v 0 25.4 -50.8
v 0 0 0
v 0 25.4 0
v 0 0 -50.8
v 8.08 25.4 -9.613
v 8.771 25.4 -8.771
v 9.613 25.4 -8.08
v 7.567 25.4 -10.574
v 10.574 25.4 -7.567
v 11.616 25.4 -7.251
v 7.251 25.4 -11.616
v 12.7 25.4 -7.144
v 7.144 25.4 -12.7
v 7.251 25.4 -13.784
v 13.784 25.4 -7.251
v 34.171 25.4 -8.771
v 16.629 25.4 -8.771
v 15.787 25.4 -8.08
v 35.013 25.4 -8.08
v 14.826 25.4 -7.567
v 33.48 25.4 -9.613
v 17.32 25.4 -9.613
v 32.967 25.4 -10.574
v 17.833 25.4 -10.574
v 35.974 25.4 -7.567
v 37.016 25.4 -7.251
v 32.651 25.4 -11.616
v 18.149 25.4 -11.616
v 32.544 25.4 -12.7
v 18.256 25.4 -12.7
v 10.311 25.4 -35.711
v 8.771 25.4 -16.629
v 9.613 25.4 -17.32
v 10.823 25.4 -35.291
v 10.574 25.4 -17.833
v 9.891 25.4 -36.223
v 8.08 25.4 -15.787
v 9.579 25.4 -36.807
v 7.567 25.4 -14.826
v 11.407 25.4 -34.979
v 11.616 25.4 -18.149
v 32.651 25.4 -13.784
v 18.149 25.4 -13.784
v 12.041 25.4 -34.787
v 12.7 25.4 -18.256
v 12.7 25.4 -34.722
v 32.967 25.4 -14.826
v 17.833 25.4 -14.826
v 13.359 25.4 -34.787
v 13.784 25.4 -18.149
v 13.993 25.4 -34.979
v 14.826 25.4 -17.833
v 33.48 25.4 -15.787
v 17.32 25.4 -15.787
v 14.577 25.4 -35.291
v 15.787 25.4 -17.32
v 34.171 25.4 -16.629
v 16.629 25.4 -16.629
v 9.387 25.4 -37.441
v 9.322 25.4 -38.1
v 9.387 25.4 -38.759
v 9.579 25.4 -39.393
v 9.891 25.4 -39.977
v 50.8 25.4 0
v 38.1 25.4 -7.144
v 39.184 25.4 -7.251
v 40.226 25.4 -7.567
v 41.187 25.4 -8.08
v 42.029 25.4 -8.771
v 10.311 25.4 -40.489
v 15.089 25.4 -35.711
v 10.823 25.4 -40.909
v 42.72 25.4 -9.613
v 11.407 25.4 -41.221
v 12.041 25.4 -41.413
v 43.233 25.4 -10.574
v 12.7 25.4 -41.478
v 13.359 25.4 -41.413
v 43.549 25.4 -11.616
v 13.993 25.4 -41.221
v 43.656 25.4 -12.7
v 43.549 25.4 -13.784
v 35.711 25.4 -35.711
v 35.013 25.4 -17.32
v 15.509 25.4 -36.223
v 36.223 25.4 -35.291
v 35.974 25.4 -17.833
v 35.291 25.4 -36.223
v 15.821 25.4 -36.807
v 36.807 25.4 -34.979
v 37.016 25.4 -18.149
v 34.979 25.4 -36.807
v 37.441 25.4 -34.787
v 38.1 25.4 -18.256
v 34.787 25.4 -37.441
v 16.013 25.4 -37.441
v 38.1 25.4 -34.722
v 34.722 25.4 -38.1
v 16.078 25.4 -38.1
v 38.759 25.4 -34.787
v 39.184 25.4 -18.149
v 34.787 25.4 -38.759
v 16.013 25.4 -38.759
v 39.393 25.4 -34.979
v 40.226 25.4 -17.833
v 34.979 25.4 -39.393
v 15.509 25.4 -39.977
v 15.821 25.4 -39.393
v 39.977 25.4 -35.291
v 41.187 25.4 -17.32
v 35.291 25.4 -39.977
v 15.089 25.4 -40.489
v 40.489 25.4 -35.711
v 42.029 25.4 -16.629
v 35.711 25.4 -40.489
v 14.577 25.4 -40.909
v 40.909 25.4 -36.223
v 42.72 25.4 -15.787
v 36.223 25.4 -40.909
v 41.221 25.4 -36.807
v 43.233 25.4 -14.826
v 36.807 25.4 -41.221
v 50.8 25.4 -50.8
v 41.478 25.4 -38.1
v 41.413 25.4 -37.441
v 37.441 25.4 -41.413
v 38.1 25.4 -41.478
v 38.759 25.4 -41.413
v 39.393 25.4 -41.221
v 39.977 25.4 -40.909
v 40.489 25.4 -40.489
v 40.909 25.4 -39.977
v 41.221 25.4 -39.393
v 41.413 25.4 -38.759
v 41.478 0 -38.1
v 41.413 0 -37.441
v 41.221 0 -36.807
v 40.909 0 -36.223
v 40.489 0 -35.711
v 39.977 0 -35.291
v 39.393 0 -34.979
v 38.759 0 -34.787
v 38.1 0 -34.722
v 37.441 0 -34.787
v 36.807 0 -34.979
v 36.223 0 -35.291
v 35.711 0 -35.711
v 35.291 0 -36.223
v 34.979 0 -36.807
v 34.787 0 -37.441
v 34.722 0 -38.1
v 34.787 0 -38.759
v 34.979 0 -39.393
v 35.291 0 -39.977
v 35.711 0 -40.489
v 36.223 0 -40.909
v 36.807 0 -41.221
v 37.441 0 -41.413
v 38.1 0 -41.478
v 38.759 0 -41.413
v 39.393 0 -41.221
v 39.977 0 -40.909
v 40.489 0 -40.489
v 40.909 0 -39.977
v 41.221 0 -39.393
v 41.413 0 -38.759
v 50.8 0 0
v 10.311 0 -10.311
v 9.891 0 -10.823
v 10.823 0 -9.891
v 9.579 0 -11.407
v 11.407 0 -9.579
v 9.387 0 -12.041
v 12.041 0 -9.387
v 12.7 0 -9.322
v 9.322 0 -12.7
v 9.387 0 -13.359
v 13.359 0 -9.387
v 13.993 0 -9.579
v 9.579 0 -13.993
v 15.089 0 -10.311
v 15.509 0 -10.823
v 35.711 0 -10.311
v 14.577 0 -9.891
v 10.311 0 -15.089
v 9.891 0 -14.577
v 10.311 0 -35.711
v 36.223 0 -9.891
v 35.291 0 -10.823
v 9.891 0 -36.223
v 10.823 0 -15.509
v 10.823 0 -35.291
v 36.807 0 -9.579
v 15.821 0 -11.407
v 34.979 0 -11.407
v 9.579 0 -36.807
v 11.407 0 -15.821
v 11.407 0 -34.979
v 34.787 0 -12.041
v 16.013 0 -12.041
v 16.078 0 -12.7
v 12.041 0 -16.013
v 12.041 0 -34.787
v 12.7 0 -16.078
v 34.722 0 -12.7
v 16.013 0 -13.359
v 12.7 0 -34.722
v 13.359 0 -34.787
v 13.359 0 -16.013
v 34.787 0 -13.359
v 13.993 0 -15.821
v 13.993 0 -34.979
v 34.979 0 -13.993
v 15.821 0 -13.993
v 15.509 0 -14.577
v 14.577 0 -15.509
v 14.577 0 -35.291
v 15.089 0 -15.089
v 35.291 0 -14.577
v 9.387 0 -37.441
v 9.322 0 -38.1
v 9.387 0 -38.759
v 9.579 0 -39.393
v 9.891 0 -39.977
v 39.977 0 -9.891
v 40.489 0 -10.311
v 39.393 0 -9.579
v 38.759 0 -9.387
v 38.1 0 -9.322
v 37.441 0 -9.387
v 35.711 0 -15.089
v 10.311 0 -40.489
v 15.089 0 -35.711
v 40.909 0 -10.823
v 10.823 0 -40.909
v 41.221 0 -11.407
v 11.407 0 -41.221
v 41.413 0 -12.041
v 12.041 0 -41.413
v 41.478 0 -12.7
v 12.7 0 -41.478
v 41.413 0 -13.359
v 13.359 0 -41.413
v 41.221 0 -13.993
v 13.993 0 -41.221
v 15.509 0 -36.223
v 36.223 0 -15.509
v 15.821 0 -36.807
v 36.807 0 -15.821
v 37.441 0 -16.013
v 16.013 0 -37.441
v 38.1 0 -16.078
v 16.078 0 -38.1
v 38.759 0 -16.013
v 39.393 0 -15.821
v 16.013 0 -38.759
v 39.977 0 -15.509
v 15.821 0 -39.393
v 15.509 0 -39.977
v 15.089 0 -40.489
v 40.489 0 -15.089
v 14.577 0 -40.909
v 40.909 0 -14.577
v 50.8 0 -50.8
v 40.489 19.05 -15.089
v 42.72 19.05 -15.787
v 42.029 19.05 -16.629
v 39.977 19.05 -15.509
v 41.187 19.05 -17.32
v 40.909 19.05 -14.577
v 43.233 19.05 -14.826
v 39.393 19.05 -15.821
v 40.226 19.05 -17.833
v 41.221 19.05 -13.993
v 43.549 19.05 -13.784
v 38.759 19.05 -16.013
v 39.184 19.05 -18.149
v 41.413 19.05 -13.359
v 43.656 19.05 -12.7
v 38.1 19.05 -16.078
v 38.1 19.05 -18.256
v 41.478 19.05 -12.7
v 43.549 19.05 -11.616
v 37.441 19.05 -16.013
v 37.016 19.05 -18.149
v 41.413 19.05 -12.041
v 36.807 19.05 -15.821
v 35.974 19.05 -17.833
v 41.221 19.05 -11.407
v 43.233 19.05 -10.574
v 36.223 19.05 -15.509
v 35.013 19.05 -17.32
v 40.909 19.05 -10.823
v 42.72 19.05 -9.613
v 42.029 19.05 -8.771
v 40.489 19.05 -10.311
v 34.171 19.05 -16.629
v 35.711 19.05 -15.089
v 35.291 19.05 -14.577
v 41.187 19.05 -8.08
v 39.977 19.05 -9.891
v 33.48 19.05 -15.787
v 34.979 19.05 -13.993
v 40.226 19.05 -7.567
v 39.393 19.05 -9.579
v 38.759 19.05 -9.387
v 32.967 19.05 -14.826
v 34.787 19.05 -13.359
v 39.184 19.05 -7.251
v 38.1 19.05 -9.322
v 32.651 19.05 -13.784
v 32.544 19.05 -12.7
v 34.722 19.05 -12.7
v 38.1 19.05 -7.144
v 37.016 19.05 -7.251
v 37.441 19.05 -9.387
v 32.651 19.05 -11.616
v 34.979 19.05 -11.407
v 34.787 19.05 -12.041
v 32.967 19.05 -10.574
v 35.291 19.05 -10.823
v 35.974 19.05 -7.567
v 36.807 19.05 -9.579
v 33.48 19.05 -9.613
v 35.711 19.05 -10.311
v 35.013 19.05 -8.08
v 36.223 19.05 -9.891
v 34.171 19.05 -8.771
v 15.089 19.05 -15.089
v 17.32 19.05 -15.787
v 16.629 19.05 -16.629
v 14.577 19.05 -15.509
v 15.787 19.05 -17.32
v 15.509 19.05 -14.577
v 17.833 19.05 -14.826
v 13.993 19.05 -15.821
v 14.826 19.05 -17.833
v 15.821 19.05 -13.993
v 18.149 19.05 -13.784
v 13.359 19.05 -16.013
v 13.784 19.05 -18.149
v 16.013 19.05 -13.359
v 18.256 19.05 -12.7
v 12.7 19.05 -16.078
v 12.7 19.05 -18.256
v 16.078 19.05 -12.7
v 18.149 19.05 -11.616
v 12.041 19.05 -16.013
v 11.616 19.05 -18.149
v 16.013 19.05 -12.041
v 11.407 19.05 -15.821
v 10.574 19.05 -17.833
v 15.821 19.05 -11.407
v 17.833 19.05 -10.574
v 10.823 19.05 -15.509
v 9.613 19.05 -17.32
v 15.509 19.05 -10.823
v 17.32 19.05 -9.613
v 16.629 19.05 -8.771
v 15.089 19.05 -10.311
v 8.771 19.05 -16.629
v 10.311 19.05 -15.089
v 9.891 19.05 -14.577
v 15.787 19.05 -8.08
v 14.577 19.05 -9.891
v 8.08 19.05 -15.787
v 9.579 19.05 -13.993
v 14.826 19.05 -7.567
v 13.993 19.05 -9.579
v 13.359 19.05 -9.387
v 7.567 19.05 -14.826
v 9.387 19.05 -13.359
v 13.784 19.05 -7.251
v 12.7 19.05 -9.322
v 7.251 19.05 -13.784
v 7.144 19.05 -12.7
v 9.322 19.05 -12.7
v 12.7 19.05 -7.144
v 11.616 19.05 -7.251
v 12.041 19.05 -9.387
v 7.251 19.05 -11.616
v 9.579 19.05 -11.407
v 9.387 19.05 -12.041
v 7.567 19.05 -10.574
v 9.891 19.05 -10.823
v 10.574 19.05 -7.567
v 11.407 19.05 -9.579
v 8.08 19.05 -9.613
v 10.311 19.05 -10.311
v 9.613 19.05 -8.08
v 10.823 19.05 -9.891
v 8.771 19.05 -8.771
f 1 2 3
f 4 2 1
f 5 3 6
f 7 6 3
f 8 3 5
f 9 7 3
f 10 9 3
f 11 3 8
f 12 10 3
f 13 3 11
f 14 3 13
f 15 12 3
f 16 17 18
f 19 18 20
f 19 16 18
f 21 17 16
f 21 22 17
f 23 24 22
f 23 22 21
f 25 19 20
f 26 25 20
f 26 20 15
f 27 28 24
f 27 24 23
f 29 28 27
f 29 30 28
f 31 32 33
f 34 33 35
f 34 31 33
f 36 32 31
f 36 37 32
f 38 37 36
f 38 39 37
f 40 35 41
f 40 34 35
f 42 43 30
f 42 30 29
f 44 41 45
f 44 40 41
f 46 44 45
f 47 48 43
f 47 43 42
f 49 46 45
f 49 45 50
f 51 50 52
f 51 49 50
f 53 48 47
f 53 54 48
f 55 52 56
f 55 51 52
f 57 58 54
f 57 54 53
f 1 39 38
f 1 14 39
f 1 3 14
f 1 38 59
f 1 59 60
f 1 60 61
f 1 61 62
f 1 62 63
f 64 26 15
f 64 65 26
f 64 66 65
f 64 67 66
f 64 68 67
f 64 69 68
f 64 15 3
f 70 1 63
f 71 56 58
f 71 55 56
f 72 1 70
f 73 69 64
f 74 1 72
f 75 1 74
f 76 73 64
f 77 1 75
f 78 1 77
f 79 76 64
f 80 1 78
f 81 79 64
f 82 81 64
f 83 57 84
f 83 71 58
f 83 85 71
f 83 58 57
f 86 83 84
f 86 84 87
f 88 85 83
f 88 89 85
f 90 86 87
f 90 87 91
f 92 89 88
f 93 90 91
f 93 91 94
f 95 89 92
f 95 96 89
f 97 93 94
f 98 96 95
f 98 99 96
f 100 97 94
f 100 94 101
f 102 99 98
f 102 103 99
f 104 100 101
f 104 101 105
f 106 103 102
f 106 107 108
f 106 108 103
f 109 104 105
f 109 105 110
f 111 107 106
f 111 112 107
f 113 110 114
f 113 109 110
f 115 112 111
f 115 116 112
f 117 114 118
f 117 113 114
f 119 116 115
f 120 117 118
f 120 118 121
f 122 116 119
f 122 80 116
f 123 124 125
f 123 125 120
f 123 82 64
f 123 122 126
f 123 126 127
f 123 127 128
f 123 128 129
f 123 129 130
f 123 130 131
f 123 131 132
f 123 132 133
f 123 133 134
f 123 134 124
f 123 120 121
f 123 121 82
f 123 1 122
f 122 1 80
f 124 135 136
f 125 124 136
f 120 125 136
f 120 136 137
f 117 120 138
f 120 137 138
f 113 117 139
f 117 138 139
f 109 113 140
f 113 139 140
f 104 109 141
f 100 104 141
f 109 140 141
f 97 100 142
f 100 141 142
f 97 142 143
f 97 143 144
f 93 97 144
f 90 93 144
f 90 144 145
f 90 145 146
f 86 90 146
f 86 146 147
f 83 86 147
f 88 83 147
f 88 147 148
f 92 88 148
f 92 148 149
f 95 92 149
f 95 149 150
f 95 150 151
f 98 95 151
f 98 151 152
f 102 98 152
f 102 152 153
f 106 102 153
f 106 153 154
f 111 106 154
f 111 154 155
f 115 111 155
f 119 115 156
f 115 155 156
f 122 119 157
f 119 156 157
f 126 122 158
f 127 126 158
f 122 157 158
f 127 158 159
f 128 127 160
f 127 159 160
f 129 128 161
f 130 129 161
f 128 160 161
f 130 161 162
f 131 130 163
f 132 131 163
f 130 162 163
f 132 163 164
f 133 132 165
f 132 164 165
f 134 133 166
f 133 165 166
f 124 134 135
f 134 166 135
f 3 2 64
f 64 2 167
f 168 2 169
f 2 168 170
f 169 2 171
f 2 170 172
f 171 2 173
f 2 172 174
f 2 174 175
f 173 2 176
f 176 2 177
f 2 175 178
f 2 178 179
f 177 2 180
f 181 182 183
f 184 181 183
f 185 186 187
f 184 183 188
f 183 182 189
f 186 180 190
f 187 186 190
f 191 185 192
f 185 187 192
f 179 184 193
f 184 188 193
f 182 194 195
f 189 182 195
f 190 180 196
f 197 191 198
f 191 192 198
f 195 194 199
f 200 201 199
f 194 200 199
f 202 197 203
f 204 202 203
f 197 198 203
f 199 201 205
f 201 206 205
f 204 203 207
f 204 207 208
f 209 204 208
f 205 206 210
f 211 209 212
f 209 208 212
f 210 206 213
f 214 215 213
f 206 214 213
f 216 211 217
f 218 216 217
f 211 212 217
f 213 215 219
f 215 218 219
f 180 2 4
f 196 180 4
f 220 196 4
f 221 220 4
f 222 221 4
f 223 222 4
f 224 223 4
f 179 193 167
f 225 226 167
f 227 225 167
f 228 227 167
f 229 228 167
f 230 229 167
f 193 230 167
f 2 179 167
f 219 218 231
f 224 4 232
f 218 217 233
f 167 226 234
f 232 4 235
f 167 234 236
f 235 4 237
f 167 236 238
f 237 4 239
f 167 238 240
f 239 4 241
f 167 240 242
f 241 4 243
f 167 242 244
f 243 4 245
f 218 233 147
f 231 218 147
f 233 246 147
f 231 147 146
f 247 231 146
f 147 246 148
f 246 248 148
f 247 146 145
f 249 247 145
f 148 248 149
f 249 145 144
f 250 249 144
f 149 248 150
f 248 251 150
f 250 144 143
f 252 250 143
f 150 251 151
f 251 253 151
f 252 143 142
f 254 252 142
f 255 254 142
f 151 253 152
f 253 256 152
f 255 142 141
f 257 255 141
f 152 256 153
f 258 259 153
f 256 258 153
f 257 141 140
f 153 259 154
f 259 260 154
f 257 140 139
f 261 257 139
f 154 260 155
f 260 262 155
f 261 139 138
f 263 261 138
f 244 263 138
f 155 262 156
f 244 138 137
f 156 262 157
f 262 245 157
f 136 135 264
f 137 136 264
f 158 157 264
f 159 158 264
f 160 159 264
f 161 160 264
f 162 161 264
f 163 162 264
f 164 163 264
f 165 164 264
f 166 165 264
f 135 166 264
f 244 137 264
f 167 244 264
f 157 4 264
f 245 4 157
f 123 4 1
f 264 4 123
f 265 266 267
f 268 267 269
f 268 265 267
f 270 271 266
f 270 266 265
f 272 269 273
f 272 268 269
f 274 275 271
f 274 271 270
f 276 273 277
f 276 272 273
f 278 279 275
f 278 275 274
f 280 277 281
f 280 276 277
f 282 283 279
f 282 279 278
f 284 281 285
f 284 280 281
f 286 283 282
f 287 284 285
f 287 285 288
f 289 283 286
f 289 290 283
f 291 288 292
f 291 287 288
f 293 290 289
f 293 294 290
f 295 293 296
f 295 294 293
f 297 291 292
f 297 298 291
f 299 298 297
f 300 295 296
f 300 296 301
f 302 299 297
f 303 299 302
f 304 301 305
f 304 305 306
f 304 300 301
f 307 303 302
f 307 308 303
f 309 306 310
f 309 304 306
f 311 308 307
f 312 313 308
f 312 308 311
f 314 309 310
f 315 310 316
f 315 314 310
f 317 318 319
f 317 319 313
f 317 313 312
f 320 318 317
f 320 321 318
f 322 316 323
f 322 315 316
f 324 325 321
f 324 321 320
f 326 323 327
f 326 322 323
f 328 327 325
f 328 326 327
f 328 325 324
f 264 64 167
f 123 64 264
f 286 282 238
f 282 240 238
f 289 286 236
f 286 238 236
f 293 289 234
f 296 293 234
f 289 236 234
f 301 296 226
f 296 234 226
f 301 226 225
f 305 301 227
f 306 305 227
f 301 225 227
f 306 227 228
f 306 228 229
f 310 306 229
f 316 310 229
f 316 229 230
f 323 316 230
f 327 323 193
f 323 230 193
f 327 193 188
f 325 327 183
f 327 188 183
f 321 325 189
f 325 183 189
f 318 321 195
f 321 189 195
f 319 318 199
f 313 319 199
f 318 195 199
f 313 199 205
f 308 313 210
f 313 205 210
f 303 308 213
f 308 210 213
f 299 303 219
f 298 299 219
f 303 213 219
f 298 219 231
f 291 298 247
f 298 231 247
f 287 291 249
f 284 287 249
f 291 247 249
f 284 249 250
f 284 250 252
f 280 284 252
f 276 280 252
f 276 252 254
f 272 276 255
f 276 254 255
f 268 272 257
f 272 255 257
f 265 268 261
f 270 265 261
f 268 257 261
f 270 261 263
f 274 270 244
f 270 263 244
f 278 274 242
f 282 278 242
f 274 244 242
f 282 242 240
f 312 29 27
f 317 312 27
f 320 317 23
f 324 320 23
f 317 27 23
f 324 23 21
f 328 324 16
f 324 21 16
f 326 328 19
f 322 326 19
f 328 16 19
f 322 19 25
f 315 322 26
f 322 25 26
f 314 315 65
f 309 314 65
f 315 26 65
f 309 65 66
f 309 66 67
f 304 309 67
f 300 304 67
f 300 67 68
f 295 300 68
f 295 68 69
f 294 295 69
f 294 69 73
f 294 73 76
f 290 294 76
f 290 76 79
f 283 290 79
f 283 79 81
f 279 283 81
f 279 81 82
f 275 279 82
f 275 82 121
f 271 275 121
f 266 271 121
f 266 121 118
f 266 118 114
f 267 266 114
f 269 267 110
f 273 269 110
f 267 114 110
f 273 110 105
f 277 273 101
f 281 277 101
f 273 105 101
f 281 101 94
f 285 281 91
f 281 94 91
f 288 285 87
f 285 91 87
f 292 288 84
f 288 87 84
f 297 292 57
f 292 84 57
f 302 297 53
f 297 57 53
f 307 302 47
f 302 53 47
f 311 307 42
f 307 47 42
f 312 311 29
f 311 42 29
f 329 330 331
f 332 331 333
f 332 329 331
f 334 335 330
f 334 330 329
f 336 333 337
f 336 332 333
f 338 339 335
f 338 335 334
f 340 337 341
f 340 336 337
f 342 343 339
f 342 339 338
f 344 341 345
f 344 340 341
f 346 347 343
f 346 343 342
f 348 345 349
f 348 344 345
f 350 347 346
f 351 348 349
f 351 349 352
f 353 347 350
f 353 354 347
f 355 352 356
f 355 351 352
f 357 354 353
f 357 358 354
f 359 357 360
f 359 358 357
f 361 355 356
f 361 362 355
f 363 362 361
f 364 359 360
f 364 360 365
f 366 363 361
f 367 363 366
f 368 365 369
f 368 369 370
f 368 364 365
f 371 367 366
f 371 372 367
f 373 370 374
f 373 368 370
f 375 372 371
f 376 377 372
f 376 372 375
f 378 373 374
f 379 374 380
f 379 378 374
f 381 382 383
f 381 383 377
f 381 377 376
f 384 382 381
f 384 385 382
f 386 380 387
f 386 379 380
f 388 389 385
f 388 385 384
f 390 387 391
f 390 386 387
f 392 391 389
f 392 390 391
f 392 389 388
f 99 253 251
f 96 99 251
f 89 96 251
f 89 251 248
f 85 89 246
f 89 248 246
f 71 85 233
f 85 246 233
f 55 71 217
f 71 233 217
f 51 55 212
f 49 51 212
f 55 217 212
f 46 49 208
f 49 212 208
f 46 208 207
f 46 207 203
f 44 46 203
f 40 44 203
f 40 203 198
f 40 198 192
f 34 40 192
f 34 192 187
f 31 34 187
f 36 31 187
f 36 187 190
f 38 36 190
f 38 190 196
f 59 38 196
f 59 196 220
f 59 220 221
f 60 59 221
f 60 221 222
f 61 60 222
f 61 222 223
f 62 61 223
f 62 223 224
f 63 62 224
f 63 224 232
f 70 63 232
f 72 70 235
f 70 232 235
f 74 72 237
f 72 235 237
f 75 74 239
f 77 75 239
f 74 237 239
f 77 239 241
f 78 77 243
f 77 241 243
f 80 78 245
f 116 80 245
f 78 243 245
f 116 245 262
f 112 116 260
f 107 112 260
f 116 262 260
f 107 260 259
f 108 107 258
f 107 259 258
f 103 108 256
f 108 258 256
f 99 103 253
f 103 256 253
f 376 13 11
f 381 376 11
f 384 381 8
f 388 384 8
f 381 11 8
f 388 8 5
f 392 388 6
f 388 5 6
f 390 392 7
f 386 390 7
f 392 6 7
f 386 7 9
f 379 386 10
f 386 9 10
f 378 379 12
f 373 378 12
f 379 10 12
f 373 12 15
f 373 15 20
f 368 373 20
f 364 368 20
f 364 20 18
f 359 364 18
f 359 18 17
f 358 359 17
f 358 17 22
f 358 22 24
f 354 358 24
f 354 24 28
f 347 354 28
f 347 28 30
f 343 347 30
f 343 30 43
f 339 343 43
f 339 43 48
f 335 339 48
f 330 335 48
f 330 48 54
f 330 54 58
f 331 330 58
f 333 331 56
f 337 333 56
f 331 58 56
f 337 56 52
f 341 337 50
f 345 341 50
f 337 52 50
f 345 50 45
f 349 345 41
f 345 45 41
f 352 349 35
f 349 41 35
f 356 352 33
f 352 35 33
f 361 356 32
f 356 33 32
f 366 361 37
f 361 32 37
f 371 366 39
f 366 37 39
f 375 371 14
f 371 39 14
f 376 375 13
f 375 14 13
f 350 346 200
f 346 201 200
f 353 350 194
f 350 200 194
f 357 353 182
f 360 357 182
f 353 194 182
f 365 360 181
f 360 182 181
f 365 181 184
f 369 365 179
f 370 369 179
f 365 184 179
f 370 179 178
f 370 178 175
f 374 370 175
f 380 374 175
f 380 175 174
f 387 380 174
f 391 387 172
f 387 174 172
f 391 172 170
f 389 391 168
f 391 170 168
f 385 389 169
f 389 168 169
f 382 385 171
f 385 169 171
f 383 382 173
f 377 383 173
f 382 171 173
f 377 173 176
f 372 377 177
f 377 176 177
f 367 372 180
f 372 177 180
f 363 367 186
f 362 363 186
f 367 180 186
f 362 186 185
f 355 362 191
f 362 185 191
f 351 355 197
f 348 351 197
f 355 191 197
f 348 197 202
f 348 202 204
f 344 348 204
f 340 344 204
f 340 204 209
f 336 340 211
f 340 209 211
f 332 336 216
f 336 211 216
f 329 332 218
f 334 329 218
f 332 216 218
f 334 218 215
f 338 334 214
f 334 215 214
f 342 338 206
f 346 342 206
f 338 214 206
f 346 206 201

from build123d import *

# Parameters (mm, degrees)
SKETCH1_W                                        = 101.6
SKETCH1_H                                        = 50.8
BOSS_EXTRUDE1_DEPTH                              = 25.4
CBORE_FOR_1_4_SOCKET_HEAD_CAP_SCREW1_D           = 6.7564
CBORE_FOR_1_4_SOCKET_HEAD_CAP_SCREW1_CBORE_D     = 11.1125
CBORE_FOR_1_4_SOCKET_HEAD_CAP_SCREW1_CBORE_DEPTH = 6.35
LPATTERN1_COUNT                                  = 4
LPATTERN1_PITCH                                  = 25.4
F_1_4_CLEARANCE_HOLE1_D                          = 6.7564
LPATTERN2_COUNT                                  = 4
LPATTERN2_PITCH                                  = 25.4
SKETCH7_W                                        = 50.8
SKETCH7_H                                        = 25.4
CUT_EXTRUDE1_DEPTH                               = 50.8


with BuildPart() as part:
    # Sketch1 → Boss-Extrude1 (new body)
    with BuildSketch(Plane(origin=(0, 0, 0), x_dir=(1, 0, 0), z_dir=(0, 1, 0))):
        with Locations((50.8, 25.4)):
            Rectangle(SKETCH1_W, SKETCH1_H)
    extrude(amount=BOSS_EXTRUDE1_DEPTH)

    # CBORE for 1/4 Socket Head Cap Screw1 (through all)
    with Locations(Plane(origin=(0, 25.4, 0), x_dir=(-1, 0, 0), z_dir=(0, 1, 0))):
        with Locations((-12.7, -12.7)):
            cbore_for_1_4_socket_head_cap_screw1 = CounterBoreHole(CBORE_FOR_1_4_SOCKET_HEAD_CAP_SCREW1_D / 2, CBORE_FOR_1_4_SOCKET_HEAD_CAP_SCREW1_CBORE_D / 2, CBORE_FOR_1_4_SOCKET_HEAD_CAP_SCREW1_CBORE_DEPTH)

    # LPattern1: CBORE for 1/4 Socket Head Cap Screw1 ×4
    with Locations(*[(i * LPATTERN1_PITCH, 0, 0) for i in range(1, LPATTERN1_COUNT)]):
        add(cbore_for_1_4_socket_head_cap_screw1, mode=Mode.SUBTRACT)

    # 1/4 Clearance Hole1 (through all)
    with Locations(Plane(origin=(0, 25.4, 0), x_dir=(-1, 0, 0), z_dir=(0, 1, 0))):
        with Locations((-12.7, -38.1)):
            f_1_4_clearance_hole1 = Hole(F_1_4_CLEARANCE_HOLE1_D / 2)

    # LPattern2: 1/4 Clearance Hole1 ×4
    with Locations(*[(i * LPATTERN2_PITCH, 0, 0) for i in range(1, LPATTERN2_COUNT)]):
        add(f_1_4_clearance_hole1, mode=Mode.SUBTRACT)

    # Sketch7 → Cut-Extrude1 (cut)
    with BuildSketch(Plane(origin=(101.6, 0, 0), x_dir=(0, 0, -1), z_dir=(1, 0, 0))):
        with Locations((25.4, 12.7)):
            Rectangle(SKETCH7_W, SKETCH7_H)
    extrude(amount=-CUT_EXTRUDE1_DEPTH, mode=Mode.SUBTRACT)


solid = part.part
